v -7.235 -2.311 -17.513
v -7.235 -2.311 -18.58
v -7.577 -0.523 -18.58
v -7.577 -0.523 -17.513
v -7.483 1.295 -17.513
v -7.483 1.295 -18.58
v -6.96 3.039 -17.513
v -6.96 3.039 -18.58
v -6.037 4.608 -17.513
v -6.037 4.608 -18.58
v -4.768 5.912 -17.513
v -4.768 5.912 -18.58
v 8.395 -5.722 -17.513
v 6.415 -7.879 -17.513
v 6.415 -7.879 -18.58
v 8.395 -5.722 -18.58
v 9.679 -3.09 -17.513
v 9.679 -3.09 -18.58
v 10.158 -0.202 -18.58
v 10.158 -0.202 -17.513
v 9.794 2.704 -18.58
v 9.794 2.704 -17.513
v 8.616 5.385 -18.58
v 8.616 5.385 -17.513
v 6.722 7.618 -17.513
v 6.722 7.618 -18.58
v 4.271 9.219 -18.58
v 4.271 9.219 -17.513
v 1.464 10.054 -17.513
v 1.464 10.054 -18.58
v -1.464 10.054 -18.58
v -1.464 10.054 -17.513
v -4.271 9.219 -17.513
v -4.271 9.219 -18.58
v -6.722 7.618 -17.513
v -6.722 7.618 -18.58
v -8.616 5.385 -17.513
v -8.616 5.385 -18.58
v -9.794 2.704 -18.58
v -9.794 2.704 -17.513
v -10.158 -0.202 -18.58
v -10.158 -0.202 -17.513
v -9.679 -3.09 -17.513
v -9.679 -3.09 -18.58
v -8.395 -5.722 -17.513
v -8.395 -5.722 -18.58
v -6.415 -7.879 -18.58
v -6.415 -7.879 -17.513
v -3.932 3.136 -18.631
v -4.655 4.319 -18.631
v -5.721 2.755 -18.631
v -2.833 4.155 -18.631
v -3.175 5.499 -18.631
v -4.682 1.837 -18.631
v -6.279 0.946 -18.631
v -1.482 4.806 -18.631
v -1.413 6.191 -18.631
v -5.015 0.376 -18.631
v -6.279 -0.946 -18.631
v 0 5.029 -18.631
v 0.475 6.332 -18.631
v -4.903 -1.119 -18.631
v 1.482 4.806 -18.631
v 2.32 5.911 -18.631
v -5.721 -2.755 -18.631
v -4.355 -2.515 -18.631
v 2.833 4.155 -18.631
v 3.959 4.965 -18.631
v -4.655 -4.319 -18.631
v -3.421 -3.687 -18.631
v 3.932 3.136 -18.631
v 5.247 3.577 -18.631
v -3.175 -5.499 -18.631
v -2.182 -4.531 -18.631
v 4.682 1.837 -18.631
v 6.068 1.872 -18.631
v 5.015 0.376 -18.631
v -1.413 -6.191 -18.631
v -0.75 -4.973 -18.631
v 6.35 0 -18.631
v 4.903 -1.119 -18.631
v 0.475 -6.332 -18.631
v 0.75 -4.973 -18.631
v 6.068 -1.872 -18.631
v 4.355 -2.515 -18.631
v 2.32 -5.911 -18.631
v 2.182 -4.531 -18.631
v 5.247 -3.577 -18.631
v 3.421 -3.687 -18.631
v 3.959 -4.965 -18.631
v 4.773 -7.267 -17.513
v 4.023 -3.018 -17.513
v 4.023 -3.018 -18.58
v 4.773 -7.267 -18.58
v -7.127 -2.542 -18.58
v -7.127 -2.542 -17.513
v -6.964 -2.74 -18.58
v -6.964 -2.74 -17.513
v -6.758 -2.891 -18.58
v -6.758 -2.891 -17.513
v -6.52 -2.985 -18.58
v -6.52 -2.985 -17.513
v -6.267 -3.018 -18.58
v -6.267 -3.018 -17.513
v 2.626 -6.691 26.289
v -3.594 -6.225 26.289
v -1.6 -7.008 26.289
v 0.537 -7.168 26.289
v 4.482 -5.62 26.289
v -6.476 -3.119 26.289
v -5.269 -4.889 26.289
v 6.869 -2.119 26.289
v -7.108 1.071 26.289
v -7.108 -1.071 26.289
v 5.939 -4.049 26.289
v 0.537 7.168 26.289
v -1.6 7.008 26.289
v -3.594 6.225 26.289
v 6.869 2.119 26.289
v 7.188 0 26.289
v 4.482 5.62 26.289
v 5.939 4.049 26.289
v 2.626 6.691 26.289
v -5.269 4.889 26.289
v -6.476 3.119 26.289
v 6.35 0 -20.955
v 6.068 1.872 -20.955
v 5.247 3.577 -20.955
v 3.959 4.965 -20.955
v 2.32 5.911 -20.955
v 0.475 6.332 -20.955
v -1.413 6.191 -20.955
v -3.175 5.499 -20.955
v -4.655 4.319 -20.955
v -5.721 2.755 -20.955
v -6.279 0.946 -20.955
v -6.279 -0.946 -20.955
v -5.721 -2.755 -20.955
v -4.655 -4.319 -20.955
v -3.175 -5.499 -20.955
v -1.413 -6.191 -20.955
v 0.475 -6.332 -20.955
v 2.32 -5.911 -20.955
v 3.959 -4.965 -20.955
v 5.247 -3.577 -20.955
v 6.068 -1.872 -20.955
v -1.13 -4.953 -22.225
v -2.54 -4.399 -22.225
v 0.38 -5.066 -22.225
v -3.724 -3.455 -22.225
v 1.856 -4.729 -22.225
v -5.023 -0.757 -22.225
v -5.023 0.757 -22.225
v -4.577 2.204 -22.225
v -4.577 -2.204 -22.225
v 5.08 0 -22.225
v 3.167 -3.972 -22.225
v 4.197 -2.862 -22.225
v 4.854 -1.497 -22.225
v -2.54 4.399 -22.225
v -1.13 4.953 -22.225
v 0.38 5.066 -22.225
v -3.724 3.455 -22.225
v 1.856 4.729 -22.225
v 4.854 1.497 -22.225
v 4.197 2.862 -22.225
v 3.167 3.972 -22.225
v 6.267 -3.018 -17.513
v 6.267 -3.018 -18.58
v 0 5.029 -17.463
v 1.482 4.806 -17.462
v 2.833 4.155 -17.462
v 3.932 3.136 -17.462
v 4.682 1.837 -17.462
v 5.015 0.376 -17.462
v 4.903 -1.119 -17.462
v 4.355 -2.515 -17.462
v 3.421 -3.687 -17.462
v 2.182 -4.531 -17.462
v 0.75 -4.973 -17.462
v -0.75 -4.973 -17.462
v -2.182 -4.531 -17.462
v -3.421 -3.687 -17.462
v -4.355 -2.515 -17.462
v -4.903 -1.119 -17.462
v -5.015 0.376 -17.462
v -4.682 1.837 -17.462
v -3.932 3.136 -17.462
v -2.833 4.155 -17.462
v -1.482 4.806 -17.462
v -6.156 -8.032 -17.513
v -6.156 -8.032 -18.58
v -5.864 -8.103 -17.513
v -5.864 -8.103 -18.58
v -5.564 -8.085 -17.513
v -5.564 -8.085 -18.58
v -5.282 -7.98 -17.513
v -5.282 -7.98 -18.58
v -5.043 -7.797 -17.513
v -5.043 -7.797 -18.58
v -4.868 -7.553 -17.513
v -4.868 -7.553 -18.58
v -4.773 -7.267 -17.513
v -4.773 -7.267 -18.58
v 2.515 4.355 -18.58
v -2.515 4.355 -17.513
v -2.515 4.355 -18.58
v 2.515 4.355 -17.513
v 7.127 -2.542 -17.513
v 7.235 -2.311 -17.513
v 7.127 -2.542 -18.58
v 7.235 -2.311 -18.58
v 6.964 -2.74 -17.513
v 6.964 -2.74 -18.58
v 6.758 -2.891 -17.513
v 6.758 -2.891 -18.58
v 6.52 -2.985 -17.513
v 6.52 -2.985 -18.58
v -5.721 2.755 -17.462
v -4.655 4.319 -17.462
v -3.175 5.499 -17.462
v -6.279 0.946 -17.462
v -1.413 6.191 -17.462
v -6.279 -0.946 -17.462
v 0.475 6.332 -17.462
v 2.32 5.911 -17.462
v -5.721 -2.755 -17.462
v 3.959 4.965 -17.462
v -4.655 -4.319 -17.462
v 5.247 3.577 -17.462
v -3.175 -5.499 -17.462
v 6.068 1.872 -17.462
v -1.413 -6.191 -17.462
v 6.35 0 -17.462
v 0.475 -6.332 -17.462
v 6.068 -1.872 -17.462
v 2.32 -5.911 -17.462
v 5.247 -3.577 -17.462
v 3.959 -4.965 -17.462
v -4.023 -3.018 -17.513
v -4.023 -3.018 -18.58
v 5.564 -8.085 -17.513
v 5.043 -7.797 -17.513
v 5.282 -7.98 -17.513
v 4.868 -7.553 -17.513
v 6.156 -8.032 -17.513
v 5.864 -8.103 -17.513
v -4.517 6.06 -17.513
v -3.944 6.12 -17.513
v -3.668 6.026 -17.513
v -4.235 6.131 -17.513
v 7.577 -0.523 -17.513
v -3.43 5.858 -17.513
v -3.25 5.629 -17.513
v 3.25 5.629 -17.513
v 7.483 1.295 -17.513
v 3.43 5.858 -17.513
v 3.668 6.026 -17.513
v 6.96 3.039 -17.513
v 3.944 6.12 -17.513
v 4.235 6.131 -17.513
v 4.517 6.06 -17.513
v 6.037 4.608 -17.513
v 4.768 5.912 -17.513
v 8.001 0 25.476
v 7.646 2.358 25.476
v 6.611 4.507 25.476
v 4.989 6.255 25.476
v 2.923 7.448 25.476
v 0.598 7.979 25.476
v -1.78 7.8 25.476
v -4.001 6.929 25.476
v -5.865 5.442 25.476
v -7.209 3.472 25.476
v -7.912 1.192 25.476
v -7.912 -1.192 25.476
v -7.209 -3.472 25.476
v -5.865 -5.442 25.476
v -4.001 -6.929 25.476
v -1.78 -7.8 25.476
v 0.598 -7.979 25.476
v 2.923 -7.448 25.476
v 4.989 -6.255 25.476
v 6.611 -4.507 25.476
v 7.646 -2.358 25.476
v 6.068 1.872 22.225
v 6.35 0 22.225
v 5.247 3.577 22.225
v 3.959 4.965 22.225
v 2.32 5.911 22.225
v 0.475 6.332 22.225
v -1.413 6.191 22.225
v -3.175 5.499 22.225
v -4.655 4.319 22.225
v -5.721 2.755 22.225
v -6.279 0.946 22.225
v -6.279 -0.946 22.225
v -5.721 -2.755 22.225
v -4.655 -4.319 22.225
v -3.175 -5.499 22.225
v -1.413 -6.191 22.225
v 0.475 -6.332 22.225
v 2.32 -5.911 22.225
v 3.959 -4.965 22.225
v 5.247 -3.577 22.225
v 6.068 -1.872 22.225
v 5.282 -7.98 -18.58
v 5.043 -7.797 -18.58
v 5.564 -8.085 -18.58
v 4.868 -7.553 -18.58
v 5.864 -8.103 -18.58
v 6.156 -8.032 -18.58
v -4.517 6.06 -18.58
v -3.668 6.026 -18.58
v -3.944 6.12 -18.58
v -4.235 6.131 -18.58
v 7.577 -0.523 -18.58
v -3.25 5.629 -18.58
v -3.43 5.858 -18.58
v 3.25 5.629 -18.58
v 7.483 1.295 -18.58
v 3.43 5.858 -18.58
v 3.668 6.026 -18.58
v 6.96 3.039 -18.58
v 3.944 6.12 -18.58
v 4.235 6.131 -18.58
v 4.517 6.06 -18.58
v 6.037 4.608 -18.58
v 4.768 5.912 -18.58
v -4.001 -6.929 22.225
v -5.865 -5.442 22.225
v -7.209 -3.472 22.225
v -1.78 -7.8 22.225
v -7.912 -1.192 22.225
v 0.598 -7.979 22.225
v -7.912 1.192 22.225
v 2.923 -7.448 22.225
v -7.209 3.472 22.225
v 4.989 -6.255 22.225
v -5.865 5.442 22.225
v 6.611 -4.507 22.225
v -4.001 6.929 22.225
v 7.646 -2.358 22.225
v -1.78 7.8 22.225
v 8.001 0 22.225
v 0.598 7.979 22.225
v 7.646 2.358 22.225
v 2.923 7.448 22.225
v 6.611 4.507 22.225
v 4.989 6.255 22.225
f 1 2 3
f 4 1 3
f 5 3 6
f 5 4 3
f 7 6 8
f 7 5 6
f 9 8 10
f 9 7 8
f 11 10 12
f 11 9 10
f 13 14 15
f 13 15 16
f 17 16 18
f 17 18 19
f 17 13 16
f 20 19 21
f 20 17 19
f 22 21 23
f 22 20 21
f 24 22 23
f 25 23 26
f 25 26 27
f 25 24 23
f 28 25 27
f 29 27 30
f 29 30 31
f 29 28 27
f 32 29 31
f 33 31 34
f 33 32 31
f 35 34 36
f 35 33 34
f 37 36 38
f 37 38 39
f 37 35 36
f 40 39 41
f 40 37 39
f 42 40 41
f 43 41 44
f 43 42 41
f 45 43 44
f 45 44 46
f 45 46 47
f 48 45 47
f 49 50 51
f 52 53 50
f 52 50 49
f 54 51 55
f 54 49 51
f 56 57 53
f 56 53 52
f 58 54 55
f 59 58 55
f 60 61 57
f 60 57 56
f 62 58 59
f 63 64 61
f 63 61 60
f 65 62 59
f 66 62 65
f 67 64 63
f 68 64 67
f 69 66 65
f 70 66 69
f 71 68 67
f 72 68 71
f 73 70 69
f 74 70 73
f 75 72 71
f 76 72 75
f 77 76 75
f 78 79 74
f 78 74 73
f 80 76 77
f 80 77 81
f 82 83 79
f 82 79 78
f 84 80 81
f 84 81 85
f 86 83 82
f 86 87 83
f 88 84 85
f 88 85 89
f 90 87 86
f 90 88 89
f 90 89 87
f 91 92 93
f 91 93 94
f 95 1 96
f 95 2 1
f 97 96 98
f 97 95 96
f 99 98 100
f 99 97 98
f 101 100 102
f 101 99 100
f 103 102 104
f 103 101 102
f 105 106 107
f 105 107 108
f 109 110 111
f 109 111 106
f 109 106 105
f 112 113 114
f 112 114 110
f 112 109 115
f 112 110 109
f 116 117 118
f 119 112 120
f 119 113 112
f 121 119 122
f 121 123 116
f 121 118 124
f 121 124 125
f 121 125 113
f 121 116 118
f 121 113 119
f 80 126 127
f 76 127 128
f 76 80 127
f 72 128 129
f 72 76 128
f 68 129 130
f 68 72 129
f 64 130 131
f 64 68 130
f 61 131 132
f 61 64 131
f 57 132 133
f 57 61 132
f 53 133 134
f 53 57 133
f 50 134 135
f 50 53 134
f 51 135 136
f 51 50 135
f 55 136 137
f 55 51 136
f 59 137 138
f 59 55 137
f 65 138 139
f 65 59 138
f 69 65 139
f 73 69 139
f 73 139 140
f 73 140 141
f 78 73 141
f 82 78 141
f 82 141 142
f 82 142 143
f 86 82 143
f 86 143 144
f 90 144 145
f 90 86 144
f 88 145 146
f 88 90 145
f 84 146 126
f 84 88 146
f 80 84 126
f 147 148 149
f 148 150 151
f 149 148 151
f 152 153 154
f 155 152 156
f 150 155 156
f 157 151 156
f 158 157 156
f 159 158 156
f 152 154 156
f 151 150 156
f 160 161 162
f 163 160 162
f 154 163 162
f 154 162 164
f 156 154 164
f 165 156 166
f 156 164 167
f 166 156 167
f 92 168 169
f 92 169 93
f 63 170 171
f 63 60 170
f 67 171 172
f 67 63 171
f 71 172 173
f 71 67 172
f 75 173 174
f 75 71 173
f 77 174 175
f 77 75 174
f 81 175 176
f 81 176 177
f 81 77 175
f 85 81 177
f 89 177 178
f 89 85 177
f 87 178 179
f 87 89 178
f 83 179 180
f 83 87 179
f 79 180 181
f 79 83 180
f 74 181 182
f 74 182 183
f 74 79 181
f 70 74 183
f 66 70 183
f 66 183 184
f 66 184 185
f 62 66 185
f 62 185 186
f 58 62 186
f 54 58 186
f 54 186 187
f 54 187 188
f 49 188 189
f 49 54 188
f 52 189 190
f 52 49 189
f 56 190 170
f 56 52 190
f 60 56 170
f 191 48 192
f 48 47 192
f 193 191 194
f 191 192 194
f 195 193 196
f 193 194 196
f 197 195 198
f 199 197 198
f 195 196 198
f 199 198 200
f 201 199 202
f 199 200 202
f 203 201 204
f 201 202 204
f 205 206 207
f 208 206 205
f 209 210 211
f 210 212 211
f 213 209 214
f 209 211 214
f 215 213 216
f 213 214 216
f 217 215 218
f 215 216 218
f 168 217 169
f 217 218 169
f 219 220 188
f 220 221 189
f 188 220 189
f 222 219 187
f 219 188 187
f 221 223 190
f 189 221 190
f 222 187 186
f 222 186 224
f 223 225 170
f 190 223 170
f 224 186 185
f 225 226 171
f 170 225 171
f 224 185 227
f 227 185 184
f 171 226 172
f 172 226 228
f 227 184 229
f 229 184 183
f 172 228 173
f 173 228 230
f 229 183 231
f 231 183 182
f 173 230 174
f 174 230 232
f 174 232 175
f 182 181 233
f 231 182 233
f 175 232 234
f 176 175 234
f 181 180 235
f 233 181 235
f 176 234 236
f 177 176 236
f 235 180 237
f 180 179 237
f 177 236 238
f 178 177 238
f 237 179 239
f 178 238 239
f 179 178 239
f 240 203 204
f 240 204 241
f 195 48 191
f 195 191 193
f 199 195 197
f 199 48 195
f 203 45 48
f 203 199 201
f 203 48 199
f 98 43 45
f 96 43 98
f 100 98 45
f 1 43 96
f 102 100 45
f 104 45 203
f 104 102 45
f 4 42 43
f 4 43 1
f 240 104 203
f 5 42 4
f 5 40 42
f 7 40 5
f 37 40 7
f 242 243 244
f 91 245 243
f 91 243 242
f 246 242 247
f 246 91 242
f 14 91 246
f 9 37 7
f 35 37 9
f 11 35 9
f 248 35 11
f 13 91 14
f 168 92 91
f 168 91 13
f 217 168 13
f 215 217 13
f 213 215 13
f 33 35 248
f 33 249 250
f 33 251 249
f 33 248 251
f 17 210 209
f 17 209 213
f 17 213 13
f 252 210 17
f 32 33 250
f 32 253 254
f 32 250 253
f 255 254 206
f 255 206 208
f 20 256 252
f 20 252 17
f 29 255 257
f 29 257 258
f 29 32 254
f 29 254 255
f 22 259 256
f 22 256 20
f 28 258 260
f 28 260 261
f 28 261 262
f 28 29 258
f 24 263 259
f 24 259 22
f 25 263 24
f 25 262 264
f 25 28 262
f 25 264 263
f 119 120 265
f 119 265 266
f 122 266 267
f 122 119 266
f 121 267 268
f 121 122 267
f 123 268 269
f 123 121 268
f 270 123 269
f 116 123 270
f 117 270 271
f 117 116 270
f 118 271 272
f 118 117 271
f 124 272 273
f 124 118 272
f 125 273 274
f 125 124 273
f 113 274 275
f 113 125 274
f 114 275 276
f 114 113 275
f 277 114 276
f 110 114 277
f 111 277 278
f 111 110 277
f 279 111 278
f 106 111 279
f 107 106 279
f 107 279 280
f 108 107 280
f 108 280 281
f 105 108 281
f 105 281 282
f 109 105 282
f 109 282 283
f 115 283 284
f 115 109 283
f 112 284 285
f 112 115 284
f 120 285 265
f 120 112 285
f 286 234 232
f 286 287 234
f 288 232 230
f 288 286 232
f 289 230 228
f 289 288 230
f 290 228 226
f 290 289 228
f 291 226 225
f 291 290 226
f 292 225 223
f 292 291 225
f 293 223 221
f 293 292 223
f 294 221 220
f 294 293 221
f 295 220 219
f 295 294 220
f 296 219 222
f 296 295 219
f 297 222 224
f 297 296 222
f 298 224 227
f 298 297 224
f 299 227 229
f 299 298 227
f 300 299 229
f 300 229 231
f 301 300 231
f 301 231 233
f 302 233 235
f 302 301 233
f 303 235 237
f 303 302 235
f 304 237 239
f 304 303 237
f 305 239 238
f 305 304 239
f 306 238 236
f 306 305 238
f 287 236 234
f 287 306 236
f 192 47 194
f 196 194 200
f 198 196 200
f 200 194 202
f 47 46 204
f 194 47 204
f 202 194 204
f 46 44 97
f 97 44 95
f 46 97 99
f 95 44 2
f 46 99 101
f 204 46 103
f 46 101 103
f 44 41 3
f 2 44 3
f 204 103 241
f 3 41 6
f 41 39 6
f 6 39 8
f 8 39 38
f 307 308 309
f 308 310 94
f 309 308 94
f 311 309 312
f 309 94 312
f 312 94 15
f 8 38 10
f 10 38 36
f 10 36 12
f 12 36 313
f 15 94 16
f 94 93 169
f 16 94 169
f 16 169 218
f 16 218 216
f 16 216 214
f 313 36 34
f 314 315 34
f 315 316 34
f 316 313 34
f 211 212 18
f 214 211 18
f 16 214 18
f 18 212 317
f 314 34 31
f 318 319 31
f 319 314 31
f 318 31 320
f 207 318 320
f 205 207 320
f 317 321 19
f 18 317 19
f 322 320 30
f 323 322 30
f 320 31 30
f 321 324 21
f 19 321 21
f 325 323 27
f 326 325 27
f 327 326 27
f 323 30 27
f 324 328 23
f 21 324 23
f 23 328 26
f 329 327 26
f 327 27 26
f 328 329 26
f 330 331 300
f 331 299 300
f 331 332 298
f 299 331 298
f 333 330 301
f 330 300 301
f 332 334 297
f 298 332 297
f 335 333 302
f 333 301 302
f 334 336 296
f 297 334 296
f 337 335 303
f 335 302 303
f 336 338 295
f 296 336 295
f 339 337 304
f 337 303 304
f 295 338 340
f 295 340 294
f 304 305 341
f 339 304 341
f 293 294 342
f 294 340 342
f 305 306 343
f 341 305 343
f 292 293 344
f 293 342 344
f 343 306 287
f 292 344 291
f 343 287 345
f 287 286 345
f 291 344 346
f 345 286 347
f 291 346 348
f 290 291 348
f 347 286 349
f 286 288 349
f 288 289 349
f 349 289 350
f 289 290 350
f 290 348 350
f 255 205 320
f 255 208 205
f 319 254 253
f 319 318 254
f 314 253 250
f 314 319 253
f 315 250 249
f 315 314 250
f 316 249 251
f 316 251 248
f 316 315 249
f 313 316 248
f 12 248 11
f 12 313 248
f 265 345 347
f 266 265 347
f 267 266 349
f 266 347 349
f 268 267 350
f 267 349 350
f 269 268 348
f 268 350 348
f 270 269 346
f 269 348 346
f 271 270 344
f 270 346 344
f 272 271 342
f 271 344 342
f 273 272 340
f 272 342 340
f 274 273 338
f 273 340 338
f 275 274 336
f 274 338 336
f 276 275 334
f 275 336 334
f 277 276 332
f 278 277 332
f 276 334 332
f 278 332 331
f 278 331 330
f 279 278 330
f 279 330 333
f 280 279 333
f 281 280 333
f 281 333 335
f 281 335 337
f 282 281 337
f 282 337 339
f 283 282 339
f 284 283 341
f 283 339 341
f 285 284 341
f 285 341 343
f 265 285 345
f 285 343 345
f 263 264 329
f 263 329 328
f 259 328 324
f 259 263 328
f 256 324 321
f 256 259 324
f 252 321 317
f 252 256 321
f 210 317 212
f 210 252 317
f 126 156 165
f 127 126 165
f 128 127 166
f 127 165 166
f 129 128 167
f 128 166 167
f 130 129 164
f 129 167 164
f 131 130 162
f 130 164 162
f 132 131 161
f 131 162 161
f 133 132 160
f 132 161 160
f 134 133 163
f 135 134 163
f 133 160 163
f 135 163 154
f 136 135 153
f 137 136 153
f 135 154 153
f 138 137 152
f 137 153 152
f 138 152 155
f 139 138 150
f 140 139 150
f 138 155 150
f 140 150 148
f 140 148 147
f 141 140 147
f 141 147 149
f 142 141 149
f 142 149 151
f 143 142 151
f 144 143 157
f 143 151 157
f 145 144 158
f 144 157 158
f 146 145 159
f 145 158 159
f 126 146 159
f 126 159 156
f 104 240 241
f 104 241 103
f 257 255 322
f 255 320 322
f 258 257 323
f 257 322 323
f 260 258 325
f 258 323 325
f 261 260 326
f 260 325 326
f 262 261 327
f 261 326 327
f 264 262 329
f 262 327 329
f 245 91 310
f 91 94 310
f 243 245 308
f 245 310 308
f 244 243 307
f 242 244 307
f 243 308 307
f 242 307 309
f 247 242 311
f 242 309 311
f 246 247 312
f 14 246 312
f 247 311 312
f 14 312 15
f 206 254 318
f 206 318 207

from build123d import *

# Parameters (mm, degrees)
SKETCH2_R      = 6.35
EXTRUDE1_DEPTH = 22.225
SKETCH3_W      = 1.1684
SKETCH3_H      = 1.3208
SKETCH8_R      = 8.001
EXTRUDE6_DEPTH = 4.064
CHAMFER2_SIZE  = 0.8128
SKETCH4_R      = 10.16
SKETCH4_R_2    = 5.0292
EXTRUDE2_DEPTH = 0.5334
EXTRUDE4_DEPTH = 23.225
EXTRUDE5_DEPTH = 1.0668
FILLET1_R      = 1.016
CHAMFER1_SIZE  = 1.27


with BuildPart() as part:
    # Sketch2 → Extrude1 (new body, symmetric)
    with BuildSketch(Plane.XY):
        Circle(SKETCH2_R)
    extrude(amount=EXTRUDE1_DEPTH, both=True)

    # Sketch3 → Cut-Revolve1 (revolve, cut)
    with BuildSketch(Plane(origin=(0, 0, 0), x_dir=(0, 0, -1), z_dir=(1, 0, 0))):
        with Locations((18.0467, 5.6896)):
            Rectangle(SKETCH3_W, SKETCH3_H)
    revolve(axis=Axis((0, 0, 22.225), (0, 0, -1)), mode=Mode.SUBTRACT)

    # Sketch8 → Extrude6 (add)
    with BuildSketch(Plane.XY.offset(22.225)):
        Circle(SKETCH8_R)
    extrude(amount=EXTRUDE6_DEPTH)

    # Chamfer2
    chamfer2_edges = [part.edges().sort_by_distance(p)[0] for p in [
        (-8.001, 0, 26.289),
    ]]
    chamfer(chamfer2_edges, length=CHAMFER2_SIZE)

    # Chamfer1
    chamfer1_edges = [part.edges().sort_by_distance(p)[0] for p in [
        (-6.35, 0, -22.225),
    ]]
    chamfer(chamfer1_edges, length=CHAMFER1_SIZE)


with BuildPart() as body_2:
    # Sketch4 → Extrude2 (new body, symmetric)
    with BuildSketch(Plane.XY.offset(-18.0467)):
        Circle(SKETCH4_R)
        Circle(SKETCH4_R_2, mode=Mode.SUBTRACT)
    extrude(amount=EXTRUDE2_DEPTH, both=True)

    # Sketch5 → Extrude4 (cut, through all)
    with BuildSketch(Plane.XY):
        with BuildLine():
            Line((-3.7973, 6.577116532), (0, 0))
            Line((0, 0), (3.7973, 6.577116532))
            ThreePointArc((3.7973, 6.577116532), (7.210736044, 2.383953619), (6.969398985, -3.01752))
            Line((6.969398985, -3.01752), (4.02336, -3.01752))
            Line((4.02336, -3.01752), (5.04618595, -8.818254213))
            ThreePointArc((5.04618595, -8.818254213), (0, -10.16), (-5.04618595, -8.818254213))
            Line((-5.04618595, -8.818254213), (-4.02336, -3.01752))
            Line((-4.02336, -3.01752), (-6.969398985, -3.01752))
            ThreePointArc((-6.969398985, -3.01752), (-7.210736044, 2.383953619), (-3.7973, 6.577116532))
        make_face()
    extrude(amount=-EXTRUDE4_DEPTH, mode=Mode.SUBTRACT)

    # Sketch6 → Extrude5 (add)
    with BuildSketch(Plane.XY.offset(-17.5133)):
        with BuildLine():
            Line((-2.5146, 4.355414961), (2.5146, 4.355414961))
            ThreePointArc((2.5146, 4.355414961), (0, 5.0292), (-2.5146, 4.355414961))
        make_face()
    extrude(amount=-EXTRUDE5_DEPTH)

    # Fillet1
    fillet1_edges = [body_2.edges().sort_by_distance(p)[0] for p in [
        (3.7973, 6.577116532, -18.0467),
        (5.04618595, -8.818254213, -18.0467),
        (-6.969398985, -3.01752, -18.0467),
        (6.969398985, -3.01752, -18.0467),
        (-5.04618595, -8.818254213, -18.0467),
        (-3.7973, 6.577116532, -18.0467),
    ]]
    fillet(fillet1_edges, radius=FILLET1_R)


solid = Compound([part.part, body_2.part])
